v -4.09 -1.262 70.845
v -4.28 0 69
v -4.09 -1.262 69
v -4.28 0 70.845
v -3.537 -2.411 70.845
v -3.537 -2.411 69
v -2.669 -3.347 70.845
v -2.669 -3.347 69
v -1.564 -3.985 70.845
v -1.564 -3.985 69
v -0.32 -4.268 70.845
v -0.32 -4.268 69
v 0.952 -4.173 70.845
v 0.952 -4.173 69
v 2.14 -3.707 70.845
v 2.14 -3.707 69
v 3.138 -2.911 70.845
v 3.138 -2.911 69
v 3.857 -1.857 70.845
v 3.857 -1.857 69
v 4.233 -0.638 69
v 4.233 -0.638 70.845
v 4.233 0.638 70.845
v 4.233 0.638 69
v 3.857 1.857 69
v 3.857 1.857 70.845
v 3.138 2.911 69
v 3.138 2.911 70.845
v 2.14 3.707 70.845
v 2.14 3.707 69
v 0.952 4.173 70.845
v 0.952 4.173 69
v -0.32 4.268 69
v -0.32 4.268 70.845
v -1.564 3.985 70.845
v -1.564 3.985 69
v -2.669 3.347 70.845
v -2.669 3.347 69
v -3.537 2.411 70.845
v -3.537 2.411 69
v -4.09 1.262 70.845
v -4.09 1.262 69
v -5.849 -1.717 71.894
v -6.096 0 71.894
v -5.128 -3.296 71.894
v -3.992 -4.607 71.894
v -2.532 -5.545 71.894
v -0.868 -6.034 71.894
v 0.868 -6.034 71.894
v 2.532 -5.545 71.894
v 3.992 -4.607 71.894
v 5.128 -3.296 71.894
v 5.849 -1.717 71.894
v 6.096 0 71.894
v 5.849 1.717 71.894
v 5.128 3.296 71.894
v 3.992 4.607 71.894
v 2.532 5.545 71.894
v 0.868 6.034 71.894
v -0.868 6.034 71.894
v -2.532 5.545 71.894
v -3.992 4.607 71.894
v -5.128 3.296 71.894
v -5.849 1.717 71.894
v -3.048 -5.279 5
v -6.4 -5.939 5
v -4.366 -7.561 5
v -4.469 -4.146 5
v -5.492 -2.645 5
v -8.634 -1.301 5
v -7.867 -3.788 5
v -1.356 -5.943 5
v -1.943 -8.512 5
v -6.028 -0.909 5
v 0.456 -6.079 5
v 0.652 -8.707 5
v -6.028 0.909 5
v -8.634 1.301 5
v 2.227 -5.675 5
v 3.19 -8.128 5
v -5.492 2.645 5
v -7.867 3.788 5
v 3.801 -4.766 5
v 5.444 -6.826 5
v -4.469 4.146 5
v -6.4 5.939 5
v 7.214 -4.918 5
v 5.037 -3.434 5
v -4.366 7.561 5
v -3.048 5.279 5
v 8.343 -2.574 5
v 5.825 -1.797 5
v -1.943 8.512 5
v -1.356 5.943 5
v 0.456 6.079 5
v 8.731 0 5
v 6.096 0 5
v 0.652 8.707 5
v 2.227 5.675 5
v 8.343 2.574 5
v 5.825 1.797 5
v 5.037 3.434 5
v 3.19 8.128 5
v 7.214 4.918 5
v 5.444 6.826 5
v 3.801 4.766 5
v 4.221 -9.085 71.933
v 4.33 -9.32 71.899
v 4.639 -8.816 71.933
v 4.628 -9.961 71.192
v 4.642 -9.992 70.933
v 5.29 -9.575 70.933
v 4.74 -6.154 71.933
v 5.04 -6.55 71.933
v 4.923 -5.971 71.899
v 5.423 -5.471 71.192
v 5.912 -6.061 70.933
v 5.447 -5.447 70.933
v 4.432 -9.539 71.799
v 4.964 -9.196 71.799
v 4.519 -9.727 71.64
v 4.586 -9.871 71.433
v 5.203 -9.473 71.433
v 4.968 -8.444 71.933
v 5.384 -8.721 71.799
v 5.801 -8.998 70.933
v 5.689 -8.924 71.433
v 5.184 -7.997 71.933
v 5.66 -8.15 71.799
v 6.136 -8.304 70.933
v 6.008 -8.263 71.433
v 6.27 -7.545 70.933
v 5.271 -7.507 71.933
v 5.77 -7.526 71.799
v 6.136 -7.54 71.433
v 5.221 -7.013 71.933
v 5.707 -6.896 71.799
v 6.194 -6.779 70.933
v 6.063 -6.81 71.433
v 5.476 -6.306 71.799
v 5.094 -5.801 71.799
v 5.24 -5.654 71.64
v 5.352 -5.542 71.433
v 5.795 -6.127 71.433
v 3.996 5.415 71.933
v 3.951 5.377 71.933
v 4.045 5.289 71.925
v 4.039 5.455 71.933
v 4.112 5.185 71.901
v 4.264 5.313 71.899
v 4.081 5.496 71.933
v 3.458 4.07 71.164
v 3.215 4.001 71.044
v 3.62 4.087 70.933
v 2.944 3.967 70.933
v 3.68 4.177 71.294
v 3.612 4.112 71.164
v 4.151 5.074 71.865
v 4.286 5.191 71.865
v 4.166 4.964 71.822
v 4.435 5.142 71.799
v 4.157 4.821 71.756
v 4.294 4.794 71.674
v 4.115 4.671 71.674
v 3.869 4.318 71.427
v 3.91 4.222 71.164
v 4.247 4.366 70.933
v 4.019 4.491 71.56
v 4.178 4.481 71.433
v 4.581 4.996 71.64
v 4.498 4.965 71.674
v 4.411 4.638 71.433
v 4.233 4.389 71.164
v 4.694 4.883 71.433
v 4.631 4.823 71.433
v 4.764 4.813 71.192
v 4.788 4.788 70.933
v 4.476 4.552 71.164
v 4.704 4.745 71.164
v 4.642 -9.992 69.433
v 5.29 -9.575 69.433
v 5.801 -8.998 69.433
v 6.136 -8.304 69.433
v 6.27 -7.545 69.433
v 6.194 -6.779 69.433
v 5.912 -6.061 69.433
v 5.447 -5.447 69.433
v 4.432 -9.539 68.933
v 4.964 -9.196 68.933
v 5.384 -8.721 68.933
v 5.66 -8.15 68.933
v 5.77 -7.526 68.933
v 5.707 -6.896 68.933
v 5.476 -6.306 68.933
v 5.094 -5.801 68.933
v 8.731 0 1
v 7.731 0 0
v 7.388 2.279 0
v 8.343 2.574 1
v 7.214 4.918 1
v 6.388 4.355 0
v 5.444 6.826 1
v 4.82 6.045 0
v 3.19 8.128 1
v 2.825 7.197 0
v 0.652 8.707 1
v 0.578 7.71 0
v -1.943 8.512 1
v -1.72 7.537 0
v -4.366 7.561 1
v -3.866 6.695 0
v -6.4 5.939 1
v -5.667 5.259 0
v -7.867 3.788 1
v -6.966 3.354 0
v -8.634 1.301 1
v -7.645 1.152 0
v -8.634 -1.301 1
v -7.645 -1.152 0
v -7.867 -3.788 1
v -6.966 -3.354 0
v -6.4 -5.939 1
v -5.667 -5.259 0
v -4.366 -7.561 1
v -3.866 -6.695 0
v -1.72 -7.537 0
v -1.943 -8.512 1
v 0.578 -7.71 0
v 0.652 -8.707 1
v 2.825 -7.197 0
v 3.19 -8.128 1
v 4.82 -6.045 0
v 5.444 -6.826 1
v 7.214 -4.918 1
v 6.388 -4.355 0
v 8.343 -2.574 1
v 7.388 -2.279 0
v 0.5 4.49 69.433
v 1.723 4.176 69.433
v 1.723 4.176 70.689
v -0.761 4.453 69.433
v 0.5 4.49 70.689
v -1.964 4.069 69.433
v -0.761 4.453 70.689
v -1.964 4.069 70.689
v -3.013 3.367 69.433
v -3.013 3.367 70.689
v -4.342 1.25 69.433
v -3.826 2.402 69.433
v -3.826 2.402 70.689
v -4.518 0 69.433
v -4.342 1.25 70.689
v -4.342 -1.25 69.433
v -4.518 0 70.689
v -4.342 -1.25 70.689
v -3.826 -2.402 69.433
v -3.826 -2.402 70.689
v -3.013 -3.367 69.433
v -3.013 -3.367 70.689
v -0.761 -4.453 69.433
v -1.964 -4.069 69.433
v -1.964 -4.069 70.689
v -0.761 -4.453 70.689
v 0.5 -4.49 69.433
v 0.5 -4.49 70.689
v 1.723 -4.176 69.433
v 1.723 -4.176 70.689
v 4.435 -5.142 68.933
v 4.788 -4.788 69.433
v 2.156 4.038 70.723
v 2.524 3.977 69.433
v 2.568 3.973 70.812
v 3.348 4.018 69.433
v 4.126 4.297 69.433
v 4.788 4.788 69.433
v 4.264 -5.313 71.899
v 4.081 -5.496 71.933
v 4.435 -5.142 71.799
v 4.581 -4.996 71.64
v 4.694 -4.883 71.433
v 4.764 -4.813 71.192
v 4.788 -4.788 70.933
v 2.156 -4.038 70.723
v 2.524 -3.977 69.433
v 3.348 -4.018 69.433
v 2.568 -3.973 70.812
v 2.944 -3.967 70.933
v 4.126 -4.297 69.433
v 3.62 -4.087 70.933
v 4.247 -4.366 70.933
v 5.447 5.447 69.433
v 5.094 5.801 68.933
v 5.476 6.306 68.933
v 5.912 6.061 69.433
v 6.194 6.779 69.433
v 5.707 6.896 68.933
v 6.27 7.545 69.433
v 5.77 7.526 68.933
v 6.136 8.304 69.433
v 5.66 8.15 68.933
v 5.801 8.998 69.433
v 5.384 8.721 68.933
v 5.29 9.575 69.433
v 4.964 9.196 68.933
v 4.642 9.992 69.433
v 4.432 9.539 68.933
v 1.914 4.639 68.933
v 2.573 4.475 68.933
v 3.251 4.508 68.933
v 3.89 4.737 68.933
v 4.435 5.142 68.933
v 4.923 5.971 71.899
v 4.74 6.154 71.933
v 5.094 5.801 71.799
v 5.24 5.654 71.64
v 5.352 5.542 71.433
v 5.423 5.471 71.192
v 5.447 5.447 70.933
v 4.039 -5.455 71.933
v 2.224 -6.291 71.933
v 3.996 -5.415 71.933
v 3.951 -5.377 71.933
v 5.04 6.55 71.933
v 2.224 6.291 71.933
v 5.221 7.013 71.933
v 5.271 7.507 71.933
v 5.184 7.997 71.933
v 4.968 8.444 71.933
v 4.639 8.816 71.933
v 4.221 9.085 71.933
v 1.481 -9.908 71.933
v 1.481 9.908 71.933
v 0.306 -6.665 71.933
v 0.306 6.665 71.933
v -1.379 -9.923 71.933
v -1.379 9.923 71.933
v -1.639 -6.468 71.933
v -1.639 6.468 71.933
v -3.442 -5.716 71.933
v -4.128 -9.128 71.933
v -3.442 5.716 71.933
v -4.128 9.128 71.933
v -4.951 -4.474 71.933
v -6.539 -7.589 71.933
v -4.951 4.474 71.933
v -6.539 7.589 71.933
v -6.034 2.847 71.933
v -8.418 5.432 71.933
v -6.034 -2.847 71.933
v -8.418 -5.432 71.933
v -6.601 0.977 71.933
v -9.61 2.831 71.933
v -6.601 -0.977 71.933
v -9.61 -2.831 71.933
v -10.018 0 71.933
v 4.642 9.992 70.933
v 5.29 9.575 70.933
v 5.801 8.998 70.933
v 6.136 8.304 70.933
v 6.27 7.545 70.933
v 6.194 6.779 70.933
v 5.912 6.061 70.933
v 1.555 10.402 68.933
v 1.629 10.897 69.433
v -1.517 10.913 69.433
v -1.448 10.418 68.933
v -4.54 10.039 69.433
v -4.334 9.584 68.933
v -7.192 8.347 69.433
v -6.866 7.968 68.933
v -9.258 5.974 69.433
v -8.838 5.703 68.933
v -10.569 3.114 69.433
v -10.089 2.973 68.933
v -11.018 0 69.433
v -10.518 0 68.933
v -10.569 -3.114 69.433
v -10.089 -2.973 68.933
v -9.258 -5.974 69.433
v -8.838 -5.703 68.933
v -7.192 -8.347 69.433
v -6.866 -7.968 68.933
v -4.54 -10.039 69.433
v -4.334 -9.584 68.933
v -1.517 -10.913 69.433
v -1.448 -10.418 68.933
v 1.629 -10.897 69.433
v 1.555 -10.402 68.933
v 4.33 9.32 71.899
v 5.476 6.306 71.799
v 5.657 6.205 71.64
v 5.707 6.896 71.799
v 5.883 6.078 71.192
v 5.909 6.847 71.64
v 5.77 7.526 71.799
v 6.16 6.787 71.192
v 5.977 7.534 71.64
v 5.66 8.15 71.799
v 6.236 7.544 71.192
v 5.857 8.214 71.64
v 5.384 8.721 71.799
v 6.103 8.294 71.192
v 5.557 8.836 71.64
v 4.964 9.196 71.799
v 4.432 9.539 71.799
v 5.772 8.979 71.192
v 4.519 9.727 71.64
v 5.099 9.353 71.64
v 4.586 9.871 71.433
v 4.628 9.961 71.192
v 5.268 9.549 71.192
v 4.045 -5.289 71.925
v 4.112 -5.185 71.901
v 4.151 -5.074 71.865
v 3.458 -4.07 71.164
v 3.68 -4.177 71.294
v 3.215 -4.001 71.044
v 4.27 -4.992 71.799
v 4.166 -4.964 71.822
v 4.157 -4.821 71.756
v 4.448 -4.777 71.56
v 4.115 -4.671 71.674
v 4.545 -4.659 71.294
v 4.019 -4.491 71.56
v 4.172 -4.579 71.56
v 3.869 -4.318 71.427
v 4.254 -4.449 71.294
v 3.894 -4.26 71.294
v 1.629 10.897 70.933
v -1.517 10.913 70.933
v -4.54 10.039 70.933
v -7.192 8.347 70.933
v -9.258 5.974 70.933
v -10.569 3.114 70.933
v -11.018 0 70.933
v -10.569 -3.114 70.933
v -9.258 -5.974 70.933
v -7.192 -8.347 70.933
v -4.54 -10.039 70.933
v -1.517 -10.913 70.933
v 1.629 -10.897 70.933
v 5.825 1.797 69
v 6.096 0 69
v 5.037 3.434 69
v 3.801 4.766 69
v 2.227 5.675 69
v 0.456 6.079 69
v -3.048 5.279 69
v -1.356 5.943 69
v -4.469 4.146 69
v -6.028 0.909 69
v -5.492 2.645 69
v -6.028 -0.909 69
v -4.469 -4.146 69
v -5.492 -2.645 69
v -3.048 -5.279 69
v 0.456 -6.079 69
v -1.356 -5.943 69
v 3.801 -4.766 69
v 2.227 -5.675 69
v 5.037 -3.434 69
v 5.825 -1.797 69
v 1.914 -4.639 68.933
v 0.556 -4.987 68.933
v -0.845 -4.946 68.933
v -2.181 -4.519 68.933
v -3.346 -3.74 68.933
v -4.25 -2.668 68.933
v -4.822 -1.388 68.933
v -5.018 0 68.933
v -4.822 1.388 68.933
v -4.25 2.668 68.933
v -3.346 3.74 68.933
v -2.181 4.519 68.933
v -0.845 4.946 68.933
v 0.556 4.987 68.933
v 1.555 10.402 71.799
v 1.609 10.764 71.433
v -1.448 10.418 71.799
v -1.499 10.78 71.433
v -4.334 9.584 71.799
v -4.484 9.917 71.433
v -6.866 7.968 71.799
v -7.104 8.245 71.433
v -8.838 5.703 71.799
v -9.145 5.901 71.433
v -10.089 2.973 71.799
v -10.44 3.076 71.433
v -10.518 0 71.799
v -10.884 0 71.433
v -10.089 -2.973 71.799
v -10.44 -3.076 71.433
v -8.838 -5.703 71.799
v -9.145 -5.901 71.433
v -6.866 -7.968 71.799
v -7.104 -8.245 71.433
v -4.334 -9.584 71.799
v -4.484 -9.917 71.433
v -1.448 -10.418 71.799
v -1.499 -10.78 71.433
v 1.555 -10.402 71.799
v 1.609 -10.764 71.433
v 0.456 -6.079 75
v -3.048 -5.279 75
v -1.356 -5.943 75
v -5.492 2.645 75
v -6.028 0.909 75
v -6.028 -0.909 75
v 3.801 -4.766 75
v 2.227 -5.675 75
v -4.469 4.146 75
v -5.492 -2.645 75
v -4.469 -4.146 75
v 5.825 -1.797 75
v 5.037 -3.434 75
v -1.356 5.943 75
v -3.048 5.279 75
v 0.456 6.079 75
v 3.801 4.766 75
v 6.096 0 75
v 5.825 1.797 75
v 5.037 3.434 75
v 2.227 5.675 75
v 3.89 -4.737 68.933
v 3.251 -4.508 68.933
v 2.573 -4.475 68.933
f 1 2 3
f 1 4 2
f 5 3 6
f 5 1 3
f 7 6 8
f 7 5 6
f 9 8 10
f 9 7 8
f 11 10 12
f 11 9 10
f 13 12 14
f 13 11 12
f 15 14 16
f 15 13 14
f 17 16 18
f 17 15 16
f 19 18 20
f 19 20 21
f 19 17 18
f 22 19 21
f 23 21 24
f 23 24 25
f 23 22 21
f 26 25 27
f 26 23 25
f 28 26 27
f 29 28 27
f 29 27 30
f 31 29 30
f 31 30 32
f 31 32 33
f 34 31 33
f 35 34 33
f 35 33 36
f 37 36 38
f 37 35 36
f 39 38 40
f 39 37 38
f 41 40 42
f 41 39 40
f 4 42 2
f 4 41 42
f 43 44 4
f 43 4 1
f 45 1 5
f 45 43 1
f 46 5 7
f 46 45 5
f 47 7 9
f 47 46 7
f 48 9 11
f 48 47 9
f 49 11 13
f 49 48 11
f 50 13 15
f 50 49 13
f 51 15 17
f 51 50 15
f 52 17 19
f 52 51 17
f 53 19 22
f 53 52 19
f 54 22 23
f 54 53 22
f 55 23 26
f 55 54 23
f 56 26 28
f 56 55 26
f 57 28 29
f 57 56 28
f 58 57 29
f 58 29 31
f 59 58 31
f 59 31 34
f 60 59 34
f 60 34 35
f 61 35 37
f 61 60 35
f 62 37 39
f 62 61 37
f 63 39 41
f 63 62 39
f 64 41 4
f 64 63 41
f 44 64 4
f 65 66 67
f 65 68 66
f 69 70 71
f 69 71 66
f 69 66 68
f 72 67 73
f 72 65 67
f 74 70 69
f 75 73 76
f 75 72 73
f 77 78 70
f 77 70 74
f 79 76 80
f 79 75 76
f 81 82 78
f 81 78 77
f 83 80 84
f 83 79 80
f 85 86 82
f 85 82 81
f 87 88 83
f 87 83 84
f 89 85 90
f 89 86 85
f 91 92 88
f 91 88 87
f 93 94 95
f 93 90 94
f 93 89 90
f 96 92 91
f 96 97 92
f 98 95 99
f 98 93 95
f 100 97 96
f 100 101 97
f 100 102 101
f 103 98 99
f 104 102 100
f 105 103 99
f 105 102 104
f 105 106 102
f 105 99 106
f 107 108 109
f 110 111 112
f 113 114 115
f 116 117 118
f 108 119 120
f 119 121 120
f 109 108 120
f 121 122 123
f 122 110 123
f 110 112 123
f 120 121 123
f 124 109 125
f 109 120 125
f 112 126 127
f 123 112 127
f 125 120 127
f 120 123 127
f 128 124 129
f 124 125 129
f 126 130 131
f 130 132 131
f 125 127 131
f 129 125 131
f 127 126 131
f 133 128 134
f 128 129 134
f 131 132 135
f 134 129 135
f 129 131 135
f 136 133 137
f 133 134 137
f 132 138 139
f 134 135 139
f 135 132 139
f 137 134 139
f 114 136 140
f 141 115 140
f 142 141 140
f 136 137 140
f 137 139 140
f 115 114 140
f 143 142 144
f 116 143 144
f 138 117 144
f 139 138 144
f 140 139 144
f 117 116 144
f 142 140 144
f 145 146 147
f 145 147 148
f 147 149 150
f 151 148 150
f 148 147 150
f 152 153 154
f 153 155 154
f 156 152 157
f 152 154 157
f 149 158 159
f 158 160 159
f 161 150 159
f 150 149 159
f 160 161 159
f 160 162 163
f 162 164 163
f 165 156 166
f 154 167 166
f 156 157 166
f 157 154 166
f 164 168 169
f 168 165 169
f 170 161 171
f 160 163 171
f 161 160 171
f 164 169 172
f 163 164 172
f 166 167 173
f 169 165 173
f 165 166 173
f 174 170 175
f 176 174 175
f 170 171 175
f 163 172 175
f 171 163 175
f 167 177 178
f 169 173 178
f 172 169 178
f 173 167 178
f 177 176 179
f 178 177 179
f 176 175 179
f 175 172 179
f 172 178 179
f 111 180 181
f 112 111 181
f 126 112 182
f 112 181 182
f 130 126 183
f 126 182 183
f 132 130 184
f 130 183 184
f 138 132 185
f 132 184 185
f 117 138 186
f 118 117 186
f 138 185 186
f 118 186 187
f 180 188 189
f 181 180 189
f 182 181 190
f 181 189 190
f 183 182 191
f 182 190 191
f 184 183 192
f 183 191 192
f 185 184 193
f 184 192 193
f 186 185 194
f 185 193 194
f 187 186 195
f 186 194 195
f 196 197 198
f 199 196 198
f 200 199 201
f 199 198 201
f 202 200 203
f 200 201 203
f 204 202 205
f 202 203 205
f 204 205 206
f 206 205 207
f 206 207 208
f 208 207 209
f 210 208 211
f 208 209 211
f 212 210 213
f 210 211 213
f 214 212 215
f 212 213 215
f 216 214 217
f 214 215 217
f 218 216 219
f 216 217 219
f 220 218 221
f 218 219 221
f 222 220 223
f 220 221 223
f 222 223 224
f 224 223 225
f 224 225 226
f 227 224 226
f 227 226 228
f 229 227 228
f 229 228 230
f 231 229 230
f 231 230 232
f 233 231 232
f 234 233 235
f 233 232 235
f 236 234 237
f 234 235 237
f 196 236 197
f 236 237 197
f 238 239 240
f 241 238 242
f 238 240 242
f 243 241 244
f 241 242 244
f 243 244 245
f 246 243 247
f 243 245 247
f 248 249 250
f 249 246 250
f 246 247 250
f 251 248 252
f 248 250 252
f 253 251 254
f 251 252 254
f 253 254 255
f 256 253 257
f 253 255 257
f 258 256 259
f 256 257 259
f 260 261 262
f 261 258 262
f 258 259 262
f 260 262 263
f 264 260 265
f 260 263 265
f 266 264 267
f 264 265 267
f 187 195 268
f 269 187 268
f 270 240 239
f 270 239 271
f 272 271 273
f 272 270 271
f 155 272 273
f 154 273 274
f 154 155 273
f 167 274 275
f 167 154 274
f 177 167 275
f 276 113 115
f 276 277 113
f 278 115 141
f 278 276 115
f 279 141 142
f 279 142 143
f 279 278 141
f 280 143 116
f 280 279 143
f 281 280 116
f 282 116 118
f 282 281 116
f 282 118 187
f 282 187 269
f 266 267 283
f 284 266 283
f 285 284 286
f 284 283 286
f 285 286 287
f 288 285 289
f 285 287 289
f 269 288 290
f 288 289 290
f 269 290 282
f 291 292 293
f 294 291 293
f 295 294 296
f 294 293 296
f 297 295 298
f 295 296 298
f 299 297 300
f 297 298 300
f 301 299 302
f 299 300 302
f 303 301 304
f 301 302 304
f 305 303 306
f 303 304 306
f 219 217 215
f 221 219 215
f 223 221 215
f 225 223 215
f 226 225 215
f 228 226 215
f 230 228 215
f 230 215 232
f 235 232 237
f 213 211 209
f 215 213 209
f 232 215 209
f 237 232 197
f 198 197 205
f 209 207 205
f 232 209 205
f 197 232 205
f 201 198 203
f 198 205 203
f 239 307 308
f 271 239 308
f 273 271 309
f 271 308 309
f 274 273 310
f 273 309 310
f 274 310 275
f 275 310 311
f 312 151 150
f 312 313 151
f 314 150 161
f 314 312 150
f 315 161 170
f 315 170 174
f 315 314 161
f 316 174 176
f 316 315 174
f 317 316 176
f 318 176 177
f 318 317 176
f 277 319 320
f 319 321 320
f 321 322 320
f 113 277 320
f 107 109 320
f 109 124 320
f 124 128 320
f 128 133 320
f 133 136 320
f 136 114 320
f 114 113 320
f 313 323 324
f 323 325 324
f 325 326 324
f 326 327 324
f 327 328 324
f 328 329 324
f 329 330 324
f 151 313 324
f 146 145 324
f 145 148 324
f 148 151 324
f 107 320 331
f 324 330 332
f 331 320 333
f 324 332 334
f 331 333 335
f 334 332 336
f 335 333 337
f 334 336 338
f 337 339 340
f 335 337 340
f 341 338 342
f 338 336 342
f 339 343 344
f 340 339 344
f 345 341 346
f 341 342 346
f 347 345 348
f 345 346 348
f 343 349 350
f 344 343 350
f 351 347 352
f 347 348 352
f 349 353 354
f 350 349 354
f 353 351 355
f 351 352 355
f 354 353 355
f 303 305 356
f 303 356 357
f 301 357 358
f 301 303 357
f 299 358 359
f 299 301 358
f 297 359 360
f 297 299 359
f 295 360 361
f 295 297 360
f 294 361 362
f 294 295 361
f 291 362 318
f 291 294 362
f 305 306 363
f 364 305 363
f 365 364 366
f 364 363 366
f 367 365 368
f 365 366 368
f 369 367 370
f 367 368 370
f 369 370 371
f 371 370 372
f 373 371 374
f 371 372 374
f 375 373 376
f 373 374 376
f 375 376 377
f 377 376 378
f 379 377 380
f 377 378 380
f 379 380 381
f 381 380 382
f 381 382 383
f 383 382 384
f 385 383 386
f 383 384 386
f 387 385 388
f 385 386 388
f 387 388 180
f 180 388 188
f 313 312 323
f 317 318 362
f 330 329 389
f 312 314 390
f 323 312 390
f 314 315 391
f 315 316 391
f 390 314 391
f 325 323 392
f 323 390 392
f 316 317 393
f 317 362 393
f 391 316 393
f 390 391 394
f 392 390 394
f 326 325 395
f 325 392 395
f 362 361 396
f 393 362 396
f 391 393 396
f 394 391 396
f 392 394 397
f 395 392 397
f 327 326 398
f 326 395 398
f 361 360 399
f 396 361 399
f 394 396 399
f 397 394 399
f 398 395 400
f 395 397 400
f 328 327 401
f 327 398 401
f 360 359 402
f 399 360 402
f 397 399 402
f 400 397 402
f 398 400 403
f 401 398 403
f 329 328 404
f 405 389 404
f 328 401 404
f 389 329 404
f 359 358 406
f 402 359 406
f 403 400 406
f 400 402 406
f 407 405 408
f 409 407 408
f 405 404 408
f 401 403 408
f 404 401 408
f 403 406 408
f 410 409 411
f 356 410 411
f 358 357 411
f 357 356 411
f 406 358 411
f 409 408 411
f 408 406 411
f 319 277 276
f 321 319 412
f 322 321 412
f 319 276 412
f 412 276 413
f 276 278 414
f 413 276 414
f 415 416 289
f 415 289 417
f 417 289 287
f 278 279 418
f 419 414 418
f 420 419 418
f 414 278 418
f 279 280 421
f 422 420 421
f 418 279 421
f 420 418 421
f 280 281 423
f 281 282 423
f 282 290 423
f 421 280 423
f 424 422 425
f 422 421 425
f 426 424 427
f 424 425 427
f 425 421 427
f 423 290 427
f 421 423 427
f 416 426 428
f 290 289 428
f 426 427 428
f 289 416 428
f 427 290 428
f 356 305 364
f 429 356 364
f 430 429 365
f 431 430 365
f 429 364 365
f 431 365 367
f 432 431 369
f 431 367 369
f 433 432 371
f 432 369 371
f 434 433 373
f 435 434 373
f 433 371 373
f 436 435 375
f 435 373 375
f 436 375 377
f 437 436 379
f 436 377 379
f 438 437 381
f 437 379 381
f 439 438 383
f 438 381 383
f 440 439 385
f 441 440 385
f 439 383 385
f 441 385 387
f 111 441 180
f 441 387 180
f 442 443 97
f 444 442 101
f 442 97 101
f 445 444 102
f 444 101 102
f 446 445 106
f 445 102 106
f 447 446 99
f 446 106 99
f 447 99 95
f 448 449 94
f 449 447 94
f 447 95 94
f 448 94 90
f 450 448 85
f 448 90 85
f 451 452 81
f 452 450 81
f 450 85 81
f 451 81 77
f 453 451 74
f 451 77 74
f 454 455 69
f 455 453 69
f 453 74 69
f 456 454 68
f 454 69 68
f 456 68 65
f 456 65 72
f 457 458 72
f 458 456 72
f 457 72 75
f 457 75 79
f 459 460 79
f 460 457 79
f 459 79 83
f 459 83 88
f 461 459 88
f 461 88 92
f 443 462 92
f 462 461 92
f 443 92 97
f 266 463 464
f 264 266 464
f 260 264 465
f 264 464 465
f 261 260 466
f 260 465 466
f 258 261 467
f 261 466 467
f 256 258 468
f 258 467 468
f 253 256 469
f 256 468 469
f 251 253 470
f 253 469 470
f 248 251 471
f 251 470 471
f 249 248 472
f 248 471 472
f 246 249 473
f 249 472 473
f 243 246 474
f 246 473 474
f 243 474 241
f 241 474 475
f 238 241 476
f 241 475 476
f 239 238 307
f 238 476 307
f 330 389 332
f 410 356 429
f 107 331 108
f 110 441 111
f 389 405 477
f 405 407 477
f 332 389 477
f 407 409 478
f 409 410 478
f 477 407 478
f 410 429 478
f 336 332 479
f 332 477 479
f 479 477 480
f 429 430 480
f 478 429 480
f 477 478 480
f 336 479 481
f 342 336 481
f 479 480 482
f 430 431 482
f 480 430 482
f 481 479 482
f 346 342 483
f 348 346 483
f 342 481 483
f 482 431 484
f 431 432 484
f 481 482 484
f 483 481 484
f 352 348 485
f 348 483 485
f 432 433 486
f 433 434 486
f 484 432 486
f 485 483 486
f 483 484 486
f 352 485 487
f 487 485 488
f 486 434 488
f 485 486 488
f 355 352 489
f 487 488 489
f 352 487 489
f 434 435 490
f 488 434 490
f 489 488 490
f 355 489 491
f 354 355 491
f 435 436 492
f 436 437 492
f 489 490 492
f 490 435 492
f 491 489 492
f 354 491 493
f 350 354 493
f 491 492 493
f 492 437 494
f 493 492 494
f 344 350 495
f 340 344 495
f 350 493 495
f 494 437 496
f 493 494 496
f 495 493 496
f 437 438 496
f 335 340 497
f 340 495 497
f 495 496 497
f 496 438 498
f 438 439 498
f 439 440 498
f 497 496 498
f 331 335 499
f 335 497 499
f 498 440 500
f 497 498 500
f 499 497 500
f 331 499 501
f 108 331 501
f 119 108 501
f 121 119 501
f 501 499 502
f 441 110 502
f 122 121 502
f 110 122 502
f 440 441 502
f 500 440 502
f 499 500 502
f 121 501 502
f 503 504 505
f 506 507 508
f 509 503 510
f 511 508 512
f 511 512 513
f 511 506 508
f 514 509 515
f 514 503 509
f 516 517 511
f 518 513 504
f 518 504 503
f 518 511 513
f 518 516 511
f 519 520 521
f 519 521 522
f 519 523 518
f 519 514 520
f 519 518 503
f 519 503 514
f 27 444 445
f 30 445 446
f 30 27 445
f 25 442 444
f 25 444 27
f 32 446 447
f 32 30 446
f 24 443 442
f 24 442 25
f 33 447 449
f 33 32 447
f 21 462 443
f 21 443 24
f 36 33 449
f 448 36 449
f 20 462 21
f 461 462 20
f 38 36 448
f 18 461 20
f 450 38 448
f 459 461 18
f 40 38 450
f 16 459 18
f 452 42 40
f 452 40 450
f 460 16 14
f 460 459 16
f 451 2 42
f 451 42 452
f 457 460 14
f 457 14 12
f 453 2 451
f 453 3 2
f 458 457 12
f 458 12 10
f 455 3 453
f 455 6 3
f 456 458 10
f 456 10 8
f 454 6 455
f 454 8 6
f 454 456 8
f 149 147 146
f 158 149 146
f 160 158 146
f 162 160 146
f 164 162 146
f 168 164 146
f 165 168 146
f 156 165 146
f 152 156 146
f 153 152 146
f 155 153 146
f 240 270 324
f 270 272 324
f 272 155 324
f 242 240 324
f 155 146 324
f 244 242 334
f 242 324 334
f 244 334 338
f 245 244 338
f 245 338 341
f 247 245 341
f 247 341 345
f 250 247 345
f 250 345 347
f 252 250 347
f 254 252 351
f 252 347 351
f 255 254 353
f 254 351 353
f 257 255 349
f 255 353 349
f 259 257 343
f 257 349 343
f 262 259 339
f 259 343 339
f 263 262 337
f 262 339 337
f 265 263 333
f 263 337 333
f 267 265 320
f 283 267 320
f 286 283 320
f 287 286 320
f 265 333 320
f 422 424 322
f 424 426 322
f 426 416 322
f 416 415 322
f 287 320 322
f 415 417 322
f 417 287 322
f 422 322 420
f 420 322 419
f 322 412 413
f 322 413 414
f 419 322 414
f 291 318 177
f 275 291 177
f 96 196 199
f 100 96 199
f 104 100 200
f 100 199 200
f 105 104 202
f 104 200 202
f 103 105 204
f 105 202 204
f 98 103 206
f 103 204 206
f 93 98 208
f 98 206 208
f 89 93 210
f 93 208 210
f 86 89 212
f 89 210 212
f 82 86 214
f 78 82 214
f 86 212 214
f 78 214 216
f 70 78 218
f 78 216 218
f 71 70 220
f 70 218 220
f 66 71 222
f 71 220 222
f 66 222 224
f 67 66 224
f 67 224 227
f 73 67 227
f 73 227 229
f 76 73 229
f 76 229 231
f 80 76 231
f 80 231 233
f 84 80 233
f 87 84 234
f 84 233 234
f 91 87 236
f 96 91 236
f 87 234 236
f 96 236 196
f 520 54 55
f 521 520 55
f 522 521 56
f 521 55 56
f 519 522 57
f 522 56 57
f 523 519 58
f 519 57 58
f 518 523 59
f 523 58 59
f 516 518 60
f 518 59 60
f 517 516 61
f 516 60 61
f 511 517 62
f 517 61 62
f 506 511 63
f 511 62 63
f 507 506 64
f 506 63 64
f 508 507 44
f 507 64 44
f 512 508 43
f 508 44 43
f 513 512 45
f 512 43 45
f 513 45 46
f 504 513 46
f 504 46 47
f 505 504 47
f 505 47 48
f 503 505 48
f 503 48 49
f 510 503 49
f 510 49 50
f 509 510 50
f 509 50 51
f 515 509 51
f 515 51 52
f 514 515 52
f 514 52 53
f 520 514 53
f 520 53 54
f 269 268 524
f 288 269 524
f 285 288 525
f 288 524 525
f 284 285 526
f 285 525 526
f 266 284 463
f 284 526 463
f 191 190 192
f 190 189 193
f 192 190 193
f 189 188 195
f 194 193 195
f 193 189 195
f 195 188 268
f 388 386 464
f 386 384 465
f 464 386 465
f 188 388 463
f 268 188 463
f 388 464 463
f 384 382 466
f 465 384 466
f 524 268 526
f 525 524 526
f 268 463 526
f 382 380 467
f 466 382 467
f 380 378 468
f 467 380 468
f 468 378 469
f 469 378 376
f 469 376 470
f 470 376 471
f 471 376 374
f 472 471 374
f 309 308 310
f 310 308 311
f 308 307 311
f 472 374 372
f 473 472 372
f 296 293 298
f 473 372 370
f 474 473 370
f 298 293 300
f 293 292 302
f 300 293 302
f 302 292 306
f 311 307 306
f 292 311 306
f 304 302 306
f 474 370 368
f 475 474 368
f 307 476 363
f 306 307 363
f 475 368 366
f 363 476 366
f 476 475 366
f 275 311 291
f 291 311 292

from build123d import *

# Parameters (mm, degrees)
F0_R          = 8.73125
F1_DEPTH      = 5
F2_R          = 6.096
F3_DEPTH      = 70
F6_SIZE       = 1
F8_ANGLE_BACK = 135
F8_ANGLE      = 270
F9_R          = 2.8160594098
F10_SIZE      = 0.5
F11_R         = 1


with BuildPart() as f1:
    # F0 (on Top) → F1 (new body)
    with BuildSketch(Plane.XY):
        Circle(F0_R)
    extrude(amount=F1_DEPTH)

    # F2 (on face) → F3 (join)
    with BuildSketch(Plane.XY.offset(5)):
        Circle(F2_R)
    extrude(amount=F3_DEPTH)

    # F4 (on Front) → F5 (revolve, cut)
    with BuildSketch(Plane.XZ):
        Polygon((-6.2804493131, 72), (-6.2804493131, 69), (-4.2804493131, 69), (-4.2804493131, 70.8452994616), align=None)
    revolve(axis=Axis((0, 0, 75), (0, 0, 1)), mode=Mode.SUBTRACT)

    # F6
    f6_edges = [f1.edges().sort_by_distance(p)[0] for p in [
        (-8.73125, 0, 0),
    ]]
    chamfer(f6_edges, length=F6_SIZE)


with BuildPart() as f8:
    # F7 (on Front) → F8 (revolve)
    with BuildSketch(Plane.XZ, mode=Mode.PRIVATE) as f8_sk:
        Polygon((-11.0179760789, 71.9328141614), (-11.0179760789, 68.9328141614), (-4.5179760789, 68.9328141614), (-4.5179760789, 70.6889052692), (-6.6724894802, 71.9328141614), align=None)
    revolve(f8_sk.sketch.rotate(Axis((0, 0, 75), (0, 0, 1)), -F8_ANGLE_BACK), axis=Axis((0, 0, 75), (0, 0, 1)), revolution_arc=F8_ANGLE)

    # F9
    f9_edges = [f8.edges().sort_by_distance(p)[0] for p in [
        (3.194692, 3.194692, 69.81086),
        (3.194692, -3.194692, 69.81086),
        (7.790886, 7.790886, 70.432814),
        (7.790886, -7.790886, 70.432814),
    ]]
    fillet(f9_edges, radius=F9_R)

    # F10
    f10_edges = [f8.edges().sort_by_distance(p)[0] for p in [
        (-11.017976, 0, 68.932814),
    ]]
    chamfer(f10_edges, length=F10_SIZE)

    # F11
    f11_edges = [f8.edges().sort_by_distance(p)[0] for p in [
        (6.228753, -7.929283, 71.932814),
    ]]
    fillet(f11_edges, radius=F11_R)


solid = Compound([f1.part, f8.part])
